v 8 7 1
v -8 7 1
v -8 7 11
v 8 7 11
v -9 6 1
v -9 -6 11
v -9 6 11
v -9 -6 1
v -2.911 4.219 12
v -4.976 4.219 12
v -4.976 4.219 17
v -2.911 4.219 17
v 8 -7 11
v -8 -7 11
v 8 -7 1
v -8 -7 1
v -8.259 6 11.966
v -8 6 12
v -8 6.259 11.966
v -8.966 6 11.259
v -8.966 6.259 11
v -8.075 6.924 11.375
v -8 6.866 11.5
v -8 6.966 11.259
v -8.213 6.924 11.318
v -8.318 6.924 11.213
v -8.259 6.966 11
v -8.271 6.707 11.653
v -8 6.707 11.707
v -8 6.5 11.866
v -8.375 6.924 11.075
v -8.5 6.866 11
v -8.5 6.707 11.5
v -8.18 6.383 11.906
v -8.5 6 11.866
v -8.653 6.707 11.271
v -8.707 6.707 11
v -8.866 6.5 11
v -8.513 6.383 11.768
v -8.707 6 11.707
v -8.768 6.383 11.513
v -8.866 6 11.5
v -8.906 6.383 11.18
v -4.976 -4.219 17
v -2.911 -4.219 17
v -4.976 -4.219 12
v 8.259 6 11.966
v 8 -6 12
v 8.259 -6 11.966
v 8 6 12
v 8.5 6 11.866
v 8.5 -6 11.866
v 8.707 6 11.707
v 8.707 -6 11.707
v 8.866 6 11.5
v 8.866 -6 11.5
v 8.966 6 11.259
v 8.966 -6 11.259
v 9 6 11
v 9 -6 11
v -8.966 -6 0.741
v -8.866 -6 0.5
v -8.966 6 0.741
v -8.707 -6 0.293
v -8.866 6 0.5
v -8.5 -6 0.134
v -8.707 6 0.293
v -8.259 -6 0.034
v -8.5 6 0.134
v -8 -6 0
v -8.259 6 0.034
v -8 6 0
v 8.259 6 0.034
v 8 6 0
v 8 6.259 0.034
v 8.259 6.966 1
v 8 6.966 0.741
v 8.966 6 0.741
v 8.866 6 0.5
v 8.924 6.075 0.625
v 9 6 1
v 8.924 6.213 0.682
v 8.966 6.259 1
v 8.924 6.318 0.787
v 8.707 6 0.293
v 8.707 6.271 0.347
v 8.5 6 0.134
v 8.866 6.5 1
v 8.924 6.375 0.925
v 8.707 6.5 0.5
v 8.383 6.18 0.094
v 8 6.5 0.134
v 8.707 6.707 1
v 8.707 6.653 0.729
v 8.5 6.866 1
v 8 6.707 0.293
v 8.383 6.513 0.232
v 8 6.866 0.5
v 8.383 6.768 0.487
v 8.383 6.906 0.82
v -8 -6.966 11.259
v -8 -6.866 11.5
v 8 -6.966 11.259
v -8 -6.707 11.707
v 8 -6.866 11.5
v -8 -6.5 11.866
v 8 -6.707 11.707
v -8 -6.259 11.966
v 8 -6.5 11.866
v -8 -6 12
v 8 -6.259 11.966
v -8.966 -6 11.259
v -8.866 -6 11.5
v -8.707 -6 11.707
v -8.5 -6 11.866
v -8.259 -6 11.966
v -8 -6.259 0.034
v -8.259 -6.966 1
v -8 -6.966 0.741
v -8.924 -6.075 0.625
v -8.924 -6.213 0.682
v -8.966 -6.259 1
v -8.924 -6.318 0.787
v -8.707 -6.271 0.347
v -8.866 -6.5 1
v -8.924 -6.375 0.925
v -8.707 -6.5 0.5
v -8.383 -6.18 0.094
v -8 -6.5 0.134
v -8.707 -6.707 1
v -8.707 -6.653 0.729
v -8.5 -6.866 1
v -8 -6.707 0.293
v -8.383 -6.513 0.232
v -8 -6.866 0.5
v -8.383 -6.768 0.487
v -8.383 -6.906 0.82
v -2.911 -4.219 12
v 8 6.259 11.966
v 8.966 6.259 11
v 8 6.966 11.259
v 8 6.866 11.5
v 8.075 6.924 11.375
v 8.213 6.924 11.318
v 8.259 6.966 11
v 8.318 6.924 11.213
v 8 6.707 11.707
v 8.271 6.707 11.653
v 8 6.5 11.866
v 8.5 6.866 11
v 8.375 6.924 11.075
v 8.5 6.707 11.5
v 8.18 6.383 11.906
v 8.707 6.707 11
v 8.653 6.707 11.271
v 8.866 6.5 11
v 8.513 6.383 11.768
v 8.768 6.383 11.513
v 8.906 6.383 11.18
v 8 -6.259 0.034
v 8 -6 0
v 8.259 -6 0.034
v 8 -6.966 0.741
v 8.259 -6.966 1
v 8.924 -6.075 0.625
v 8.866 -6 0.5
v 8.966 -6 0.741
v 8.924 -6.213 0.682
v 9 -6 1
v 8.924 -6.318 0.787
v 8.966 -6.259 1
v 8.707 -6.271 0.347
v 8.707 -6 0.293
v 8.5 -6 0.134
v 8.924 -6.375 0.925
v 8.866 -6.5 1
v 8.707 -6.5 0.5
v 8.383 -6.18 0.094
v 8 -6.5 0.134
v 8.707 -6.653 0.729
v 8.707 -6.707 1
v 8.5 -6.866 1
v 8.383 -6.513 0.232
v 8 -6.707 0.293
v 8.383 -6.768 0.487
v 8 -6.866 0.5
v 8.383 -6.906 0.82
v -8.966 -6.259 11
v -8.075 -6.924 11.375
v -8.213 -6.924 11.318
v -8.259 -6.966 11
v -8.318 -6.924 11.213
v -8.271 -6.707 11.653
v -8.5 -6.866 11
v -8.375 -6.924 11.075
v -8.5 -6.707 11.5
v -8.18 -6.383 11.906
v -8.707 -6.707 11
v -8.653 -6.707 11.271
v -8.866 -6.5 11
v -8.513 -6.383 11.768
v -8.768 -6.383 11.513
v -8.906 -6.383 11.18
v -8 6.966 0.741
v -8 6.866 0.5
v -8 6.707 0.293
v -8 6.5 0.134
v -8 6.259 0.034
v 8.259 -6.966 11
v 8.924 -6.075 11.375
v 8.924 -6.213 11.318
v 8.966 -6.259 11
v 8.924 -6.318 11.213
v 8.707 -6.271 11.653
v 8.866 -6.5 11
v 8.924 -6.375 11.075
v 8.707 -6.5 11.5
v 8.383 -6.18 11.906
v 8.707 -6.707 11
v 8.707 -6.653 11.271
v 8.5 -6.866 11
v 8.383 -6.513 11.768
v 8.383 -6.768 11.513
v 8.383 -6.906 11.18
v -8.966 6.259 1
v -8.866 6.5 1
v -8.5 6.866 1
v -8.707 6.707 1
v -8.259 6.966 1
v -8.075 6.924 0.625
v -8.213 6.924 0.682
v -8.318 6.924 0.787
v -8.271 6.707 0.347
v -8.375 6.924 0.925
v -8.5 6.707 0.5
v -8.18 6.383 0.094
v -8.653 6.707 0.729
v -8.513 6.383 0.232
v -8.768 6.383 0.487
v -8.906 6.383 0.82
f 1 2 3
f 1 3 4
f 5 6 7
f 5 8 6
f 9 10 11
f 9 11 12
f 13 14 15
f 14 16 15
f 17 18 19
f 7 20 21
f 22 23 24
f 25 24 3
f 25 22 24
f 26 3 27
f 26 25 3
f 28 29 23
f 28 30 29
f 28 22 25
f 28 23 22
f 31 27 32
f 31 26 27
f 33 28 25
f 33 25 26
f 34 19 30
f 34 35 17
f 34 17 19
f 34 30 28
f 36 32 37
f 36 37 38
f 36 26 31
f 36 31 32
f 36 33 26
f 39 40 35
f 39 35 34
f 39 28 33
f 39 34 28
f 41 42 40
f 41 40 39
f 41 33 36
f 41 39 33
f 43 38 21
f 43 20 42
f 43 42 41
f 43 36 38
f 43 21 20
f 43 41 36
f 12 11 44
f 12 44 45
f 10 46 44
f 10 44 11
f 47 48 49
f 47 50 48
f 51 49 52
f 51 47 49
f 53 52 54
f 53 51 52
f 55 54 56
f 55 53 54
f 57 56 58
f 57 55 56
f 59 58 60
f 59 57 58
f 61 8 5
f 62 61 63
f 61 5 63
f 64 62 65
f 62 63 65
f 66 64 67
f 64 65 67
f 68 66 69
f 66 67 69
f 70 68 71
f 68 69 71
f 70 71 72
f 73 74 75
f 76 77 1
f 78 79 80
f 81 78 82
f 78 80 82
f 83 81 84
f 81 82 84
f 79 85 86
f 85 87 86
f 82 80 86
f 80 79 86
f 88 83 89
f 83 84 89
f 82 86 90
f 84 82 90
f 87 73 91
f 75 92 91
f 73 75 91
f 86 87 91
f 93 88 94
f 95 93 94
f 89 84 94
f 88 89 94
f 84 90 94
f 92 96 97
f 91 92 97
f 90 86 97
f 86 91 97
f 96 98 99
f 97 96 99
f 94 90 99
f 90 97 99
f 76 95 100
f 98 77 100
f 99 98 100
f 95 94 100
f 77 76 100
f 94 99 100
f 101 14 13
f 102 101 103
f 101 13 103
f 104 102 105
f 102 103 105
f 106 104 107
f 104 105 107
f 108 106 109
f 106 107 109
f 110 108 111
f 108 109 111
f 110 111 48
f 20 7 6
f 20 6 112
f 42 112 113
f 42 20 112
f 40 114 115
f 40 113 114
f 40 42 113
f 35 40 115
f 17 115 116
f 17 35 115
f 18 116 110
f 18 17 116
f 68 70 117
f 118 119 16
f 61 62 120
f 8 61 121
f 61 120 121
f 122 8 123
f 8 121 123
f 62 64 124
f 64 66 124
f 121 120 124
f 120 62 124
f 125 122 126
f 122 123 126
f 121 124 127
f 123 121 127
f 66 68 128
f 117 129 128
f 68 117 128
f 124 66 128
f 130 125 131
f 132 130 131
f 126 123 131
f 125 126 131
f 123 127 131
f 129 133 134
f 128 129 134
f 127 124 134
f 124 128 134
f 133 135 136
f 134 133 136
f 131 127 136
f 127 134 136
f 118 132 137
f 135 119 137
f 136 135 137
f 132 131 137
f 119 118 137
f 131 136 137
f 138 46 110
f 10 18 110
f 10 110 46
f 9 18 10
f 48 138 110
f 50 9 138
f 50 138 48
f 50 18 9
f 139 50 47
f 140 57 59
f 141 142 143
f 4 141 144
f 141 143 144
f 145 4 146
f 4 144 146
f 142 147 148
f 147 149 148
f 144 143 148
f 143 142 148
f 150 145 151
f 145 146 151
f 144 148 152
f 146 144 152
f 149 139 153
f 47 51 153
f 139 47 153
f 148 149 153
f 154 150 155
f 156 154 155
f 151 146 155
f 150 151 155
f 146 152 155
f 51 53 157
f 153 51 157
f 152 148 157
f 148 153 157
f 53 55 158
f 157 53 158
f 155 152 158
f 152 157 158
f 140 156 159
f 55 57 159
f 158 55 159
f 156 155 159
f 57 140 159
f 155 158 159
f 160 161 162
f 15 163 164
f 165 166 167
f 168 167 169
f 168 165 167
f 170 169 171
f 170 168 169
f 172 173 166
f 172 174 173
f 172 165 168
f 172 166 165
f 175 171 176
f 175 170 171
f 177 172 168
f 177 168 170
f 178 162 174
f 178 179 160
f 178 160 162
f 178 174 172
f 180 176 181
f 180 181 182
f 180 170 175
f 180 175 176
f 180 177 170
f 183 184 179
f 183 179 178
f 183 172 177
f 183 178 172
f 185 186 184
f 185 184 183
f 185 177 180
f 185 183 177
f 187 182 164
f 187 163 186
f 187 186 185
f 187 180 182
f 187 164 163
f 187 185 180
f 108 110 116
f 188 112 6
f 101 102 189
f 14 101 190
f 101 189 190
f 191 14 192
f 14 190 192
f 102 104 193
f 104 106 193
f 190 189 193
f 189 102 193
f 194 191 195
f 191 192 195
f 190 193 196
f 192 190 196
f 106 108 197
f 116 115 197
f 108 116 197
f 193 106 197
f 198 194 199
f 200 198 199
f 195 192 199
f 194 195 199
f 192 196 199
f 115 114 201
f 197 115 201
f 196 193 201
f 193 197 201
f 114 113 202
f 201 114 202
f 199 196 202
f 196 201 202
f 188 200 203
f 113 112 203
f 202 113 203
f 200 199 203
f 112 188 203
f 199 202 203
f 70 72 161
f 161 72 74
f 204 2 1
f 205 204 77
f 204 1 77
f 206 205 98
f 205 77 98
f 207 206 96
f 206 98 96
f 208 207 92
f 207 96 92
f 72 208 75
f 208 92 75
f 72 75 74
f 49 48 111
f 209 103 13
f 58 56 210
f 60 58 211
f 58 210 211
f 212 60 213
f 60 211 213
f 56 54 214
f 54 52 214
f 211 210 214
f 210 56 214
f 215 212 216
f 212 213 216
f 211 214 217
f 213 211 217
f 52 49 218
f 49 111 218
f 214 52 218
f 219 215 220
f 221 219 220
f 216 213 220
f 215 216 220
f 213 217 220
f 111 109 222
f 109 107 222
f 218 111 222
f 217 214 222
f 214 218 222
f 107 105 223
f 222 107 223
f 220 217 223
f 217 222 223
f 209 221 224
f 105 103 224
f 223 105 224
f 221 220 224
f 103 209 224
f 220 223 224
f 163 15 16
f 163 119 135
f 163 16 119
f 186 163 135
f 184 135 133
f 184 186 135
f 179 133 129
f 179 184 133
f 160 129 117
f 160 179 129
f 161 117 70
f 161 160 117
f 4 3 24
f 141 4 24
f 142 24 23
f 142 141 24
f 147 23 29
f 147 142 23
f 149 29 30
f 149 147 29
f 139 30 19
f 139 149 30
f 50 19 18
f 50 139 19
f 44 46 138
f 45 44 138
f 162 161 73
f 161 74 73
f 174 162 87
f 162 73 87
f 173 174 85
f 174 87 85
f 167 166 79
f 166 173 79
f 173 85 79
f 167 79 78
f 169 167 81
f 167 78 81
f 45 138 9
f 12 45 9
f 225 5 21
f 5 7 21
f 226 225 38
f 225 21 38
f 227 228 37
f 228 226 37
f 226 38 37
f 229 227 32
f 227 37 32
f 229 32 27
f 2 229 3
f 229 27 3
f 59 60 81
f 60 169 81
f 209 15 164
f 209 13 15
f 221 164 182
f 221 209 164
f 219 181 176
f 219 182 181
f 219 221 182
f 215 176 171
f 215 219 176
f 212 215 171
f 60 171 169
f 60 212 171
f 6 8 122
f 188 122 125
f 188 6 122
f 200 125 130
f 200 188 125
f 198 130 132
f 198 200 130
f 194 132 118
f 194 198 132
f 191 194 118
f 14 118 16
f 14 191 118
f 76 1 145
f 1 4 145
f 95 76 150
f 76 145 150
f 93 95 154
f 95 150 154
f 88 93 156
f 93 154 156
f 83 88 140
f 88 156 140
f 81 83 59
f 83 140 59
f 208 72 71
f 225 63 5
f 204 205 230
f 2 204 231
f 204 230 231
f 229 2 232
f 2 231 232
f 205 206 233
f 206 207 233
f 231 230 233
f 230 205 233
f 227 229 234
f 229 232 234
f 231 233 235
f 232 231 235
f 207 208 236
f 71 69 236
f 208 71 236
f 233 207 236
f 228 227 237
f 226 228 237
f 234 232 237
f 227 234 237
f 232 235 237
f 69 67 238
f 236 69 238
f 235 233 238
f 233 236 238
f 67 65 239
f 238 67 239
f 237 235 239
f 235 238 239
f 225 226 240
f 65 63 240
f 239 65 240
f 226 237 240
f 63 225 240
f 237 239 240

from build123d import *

# Parameters (mm, degrees)
SKETCH_1_W      = 18
SKETCH_1_H      = 14
EXTRUDE_1_DEPTH = 12
SKETCH_2_W      = 2.064874792
SKETCH_2_H      = 8.438190256
EXTRUDE_2_DEPTH = 5
FILLET_1_R      = 1


with BuildPart() as part:
    # Эскиз1 → Бобышка-Вытянуть1 (new body)
    with BuildSketch(Plane.XY):
        Rectangle(SKETCH_1_W, SKETCH_1_H)
    extrude(amount=EXTRUDE_1_DEPTH)

    # Эскиз2 → Бобышка-Вытянуть2 (add)
    with BuildSketch(Plane.XY.offset(12)):
        with Locations((-3.943253735, 0)):
            Rectangle(SKETCH_2_W, SKETCH_2_H)
    extrude(amount=EXTRUDE_2_DEPTH)

    # Скругление1
    fillet_1_edges = [part.edges().sort_by_distance(p)[0] for p in [
        (-9, 0, 12),
        (0, -7, 12),
        (9, 0, 12),
        (0, -7, 0),
        (-9, 0, 0),
        (0, 7, 0),
        (9, 0, 0),
        (0, 7, 12),
        (9, -7, 6),
        (-9, -7, 6),
        (-9, 7, 6),
        (9, 7, 6),
    ]]
    fillet(fillet_1_edges, radius=FILLET_1_R)


solid = part.part
